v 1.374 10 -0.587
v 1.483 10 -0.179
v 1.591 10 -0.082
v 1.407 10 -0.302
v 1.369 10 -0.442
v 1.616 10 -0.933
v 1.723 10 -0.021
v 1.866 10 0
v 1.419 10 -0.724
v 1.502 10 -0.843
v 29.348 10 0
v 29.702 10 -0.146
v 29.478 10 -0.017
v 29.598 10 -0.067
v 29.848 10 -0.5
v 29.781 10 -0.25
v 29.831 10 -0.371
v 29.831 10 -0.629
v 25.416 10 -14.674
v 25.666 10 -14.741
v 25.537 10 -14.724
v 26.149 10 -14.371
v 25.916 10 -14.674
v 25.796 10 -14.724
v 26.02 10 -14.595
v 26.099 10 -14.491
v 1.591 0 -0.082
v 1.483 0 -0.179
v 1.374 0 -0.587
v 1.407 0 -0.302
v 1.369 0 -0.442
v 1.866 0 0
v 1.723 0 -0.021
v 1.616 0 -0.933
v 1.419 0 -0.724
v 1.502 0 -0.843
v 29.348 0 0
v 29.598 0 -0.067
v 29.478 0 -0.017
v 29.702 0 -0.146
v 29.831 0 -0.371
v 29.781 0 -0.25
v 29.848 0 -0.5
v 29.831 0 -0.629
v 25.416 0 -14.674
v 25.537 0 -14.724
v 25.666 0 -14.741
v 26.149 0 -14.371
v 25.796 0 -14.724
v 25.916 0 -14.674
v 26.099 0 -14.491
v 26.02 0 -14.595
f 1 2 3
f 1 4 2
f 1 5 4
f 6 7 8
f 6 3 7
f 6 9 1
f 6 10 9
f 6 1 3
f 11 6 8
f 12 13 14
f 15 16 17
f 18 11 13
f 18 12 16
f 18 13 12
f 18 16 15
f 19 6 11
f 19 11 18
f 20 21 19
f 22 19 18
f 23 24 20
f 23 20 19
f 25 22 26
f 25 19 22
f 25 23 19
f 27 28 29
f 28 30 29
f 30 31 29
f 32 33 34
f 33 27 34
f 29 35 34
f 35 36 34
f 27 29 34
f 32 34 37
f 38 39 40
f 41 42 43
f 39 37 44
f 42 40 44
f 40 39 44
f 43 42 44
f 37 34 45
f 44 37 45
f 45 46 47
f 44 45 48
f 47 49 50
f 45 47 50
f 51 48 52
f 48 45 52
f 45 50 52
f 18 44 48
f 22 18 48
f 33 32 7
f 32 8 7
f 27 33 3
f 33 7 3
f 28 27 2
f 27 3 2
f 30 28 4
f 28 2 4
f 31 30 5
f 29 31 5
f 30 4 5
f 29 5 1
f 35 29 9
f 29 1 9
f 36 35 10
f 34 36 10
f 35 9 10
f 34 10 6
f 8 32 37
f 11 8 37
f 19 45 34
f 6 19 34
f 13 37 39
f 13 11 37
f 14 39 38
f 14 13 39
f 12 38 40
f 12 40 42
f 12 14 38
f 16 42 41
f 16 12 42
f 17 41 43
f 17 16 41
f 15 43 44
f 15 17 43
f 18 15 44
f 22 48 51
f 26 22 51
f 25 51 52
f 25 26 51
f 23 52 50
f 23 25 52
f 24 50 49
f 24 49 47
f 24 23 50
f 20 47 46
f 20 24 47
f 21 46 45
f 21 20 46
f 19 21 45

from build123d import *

# Parameters (mm, degrees)
BOSS_EXTRUDE1_DEPTH = 10
FILLET1_R           = 0.5


with BuildPart() as part:
    # Sketch1 → Boss-Extrude1 (new body)
    with BuildSketch(Plane(origin=(0, 0, 0), x_dir=(1, 0, 0), z_dir=(0, 1, 0))):
        Polygon((0, 0), (30, 0), (25.980762114, 15), align=None)
    extrude(amount=BOSS_EXTRUDE1_DEPTH)

    # Fillet1
    fillet1_edges = [part.edges().sort_by_distance(p)[0] for p in [
        (30, 5, 0),
        (0, 5, 0),
        (25.980762114, 5, -15),
    ]]
    fillet(fillet1_edges, radius=FILLET1_R)


solid = part.part
